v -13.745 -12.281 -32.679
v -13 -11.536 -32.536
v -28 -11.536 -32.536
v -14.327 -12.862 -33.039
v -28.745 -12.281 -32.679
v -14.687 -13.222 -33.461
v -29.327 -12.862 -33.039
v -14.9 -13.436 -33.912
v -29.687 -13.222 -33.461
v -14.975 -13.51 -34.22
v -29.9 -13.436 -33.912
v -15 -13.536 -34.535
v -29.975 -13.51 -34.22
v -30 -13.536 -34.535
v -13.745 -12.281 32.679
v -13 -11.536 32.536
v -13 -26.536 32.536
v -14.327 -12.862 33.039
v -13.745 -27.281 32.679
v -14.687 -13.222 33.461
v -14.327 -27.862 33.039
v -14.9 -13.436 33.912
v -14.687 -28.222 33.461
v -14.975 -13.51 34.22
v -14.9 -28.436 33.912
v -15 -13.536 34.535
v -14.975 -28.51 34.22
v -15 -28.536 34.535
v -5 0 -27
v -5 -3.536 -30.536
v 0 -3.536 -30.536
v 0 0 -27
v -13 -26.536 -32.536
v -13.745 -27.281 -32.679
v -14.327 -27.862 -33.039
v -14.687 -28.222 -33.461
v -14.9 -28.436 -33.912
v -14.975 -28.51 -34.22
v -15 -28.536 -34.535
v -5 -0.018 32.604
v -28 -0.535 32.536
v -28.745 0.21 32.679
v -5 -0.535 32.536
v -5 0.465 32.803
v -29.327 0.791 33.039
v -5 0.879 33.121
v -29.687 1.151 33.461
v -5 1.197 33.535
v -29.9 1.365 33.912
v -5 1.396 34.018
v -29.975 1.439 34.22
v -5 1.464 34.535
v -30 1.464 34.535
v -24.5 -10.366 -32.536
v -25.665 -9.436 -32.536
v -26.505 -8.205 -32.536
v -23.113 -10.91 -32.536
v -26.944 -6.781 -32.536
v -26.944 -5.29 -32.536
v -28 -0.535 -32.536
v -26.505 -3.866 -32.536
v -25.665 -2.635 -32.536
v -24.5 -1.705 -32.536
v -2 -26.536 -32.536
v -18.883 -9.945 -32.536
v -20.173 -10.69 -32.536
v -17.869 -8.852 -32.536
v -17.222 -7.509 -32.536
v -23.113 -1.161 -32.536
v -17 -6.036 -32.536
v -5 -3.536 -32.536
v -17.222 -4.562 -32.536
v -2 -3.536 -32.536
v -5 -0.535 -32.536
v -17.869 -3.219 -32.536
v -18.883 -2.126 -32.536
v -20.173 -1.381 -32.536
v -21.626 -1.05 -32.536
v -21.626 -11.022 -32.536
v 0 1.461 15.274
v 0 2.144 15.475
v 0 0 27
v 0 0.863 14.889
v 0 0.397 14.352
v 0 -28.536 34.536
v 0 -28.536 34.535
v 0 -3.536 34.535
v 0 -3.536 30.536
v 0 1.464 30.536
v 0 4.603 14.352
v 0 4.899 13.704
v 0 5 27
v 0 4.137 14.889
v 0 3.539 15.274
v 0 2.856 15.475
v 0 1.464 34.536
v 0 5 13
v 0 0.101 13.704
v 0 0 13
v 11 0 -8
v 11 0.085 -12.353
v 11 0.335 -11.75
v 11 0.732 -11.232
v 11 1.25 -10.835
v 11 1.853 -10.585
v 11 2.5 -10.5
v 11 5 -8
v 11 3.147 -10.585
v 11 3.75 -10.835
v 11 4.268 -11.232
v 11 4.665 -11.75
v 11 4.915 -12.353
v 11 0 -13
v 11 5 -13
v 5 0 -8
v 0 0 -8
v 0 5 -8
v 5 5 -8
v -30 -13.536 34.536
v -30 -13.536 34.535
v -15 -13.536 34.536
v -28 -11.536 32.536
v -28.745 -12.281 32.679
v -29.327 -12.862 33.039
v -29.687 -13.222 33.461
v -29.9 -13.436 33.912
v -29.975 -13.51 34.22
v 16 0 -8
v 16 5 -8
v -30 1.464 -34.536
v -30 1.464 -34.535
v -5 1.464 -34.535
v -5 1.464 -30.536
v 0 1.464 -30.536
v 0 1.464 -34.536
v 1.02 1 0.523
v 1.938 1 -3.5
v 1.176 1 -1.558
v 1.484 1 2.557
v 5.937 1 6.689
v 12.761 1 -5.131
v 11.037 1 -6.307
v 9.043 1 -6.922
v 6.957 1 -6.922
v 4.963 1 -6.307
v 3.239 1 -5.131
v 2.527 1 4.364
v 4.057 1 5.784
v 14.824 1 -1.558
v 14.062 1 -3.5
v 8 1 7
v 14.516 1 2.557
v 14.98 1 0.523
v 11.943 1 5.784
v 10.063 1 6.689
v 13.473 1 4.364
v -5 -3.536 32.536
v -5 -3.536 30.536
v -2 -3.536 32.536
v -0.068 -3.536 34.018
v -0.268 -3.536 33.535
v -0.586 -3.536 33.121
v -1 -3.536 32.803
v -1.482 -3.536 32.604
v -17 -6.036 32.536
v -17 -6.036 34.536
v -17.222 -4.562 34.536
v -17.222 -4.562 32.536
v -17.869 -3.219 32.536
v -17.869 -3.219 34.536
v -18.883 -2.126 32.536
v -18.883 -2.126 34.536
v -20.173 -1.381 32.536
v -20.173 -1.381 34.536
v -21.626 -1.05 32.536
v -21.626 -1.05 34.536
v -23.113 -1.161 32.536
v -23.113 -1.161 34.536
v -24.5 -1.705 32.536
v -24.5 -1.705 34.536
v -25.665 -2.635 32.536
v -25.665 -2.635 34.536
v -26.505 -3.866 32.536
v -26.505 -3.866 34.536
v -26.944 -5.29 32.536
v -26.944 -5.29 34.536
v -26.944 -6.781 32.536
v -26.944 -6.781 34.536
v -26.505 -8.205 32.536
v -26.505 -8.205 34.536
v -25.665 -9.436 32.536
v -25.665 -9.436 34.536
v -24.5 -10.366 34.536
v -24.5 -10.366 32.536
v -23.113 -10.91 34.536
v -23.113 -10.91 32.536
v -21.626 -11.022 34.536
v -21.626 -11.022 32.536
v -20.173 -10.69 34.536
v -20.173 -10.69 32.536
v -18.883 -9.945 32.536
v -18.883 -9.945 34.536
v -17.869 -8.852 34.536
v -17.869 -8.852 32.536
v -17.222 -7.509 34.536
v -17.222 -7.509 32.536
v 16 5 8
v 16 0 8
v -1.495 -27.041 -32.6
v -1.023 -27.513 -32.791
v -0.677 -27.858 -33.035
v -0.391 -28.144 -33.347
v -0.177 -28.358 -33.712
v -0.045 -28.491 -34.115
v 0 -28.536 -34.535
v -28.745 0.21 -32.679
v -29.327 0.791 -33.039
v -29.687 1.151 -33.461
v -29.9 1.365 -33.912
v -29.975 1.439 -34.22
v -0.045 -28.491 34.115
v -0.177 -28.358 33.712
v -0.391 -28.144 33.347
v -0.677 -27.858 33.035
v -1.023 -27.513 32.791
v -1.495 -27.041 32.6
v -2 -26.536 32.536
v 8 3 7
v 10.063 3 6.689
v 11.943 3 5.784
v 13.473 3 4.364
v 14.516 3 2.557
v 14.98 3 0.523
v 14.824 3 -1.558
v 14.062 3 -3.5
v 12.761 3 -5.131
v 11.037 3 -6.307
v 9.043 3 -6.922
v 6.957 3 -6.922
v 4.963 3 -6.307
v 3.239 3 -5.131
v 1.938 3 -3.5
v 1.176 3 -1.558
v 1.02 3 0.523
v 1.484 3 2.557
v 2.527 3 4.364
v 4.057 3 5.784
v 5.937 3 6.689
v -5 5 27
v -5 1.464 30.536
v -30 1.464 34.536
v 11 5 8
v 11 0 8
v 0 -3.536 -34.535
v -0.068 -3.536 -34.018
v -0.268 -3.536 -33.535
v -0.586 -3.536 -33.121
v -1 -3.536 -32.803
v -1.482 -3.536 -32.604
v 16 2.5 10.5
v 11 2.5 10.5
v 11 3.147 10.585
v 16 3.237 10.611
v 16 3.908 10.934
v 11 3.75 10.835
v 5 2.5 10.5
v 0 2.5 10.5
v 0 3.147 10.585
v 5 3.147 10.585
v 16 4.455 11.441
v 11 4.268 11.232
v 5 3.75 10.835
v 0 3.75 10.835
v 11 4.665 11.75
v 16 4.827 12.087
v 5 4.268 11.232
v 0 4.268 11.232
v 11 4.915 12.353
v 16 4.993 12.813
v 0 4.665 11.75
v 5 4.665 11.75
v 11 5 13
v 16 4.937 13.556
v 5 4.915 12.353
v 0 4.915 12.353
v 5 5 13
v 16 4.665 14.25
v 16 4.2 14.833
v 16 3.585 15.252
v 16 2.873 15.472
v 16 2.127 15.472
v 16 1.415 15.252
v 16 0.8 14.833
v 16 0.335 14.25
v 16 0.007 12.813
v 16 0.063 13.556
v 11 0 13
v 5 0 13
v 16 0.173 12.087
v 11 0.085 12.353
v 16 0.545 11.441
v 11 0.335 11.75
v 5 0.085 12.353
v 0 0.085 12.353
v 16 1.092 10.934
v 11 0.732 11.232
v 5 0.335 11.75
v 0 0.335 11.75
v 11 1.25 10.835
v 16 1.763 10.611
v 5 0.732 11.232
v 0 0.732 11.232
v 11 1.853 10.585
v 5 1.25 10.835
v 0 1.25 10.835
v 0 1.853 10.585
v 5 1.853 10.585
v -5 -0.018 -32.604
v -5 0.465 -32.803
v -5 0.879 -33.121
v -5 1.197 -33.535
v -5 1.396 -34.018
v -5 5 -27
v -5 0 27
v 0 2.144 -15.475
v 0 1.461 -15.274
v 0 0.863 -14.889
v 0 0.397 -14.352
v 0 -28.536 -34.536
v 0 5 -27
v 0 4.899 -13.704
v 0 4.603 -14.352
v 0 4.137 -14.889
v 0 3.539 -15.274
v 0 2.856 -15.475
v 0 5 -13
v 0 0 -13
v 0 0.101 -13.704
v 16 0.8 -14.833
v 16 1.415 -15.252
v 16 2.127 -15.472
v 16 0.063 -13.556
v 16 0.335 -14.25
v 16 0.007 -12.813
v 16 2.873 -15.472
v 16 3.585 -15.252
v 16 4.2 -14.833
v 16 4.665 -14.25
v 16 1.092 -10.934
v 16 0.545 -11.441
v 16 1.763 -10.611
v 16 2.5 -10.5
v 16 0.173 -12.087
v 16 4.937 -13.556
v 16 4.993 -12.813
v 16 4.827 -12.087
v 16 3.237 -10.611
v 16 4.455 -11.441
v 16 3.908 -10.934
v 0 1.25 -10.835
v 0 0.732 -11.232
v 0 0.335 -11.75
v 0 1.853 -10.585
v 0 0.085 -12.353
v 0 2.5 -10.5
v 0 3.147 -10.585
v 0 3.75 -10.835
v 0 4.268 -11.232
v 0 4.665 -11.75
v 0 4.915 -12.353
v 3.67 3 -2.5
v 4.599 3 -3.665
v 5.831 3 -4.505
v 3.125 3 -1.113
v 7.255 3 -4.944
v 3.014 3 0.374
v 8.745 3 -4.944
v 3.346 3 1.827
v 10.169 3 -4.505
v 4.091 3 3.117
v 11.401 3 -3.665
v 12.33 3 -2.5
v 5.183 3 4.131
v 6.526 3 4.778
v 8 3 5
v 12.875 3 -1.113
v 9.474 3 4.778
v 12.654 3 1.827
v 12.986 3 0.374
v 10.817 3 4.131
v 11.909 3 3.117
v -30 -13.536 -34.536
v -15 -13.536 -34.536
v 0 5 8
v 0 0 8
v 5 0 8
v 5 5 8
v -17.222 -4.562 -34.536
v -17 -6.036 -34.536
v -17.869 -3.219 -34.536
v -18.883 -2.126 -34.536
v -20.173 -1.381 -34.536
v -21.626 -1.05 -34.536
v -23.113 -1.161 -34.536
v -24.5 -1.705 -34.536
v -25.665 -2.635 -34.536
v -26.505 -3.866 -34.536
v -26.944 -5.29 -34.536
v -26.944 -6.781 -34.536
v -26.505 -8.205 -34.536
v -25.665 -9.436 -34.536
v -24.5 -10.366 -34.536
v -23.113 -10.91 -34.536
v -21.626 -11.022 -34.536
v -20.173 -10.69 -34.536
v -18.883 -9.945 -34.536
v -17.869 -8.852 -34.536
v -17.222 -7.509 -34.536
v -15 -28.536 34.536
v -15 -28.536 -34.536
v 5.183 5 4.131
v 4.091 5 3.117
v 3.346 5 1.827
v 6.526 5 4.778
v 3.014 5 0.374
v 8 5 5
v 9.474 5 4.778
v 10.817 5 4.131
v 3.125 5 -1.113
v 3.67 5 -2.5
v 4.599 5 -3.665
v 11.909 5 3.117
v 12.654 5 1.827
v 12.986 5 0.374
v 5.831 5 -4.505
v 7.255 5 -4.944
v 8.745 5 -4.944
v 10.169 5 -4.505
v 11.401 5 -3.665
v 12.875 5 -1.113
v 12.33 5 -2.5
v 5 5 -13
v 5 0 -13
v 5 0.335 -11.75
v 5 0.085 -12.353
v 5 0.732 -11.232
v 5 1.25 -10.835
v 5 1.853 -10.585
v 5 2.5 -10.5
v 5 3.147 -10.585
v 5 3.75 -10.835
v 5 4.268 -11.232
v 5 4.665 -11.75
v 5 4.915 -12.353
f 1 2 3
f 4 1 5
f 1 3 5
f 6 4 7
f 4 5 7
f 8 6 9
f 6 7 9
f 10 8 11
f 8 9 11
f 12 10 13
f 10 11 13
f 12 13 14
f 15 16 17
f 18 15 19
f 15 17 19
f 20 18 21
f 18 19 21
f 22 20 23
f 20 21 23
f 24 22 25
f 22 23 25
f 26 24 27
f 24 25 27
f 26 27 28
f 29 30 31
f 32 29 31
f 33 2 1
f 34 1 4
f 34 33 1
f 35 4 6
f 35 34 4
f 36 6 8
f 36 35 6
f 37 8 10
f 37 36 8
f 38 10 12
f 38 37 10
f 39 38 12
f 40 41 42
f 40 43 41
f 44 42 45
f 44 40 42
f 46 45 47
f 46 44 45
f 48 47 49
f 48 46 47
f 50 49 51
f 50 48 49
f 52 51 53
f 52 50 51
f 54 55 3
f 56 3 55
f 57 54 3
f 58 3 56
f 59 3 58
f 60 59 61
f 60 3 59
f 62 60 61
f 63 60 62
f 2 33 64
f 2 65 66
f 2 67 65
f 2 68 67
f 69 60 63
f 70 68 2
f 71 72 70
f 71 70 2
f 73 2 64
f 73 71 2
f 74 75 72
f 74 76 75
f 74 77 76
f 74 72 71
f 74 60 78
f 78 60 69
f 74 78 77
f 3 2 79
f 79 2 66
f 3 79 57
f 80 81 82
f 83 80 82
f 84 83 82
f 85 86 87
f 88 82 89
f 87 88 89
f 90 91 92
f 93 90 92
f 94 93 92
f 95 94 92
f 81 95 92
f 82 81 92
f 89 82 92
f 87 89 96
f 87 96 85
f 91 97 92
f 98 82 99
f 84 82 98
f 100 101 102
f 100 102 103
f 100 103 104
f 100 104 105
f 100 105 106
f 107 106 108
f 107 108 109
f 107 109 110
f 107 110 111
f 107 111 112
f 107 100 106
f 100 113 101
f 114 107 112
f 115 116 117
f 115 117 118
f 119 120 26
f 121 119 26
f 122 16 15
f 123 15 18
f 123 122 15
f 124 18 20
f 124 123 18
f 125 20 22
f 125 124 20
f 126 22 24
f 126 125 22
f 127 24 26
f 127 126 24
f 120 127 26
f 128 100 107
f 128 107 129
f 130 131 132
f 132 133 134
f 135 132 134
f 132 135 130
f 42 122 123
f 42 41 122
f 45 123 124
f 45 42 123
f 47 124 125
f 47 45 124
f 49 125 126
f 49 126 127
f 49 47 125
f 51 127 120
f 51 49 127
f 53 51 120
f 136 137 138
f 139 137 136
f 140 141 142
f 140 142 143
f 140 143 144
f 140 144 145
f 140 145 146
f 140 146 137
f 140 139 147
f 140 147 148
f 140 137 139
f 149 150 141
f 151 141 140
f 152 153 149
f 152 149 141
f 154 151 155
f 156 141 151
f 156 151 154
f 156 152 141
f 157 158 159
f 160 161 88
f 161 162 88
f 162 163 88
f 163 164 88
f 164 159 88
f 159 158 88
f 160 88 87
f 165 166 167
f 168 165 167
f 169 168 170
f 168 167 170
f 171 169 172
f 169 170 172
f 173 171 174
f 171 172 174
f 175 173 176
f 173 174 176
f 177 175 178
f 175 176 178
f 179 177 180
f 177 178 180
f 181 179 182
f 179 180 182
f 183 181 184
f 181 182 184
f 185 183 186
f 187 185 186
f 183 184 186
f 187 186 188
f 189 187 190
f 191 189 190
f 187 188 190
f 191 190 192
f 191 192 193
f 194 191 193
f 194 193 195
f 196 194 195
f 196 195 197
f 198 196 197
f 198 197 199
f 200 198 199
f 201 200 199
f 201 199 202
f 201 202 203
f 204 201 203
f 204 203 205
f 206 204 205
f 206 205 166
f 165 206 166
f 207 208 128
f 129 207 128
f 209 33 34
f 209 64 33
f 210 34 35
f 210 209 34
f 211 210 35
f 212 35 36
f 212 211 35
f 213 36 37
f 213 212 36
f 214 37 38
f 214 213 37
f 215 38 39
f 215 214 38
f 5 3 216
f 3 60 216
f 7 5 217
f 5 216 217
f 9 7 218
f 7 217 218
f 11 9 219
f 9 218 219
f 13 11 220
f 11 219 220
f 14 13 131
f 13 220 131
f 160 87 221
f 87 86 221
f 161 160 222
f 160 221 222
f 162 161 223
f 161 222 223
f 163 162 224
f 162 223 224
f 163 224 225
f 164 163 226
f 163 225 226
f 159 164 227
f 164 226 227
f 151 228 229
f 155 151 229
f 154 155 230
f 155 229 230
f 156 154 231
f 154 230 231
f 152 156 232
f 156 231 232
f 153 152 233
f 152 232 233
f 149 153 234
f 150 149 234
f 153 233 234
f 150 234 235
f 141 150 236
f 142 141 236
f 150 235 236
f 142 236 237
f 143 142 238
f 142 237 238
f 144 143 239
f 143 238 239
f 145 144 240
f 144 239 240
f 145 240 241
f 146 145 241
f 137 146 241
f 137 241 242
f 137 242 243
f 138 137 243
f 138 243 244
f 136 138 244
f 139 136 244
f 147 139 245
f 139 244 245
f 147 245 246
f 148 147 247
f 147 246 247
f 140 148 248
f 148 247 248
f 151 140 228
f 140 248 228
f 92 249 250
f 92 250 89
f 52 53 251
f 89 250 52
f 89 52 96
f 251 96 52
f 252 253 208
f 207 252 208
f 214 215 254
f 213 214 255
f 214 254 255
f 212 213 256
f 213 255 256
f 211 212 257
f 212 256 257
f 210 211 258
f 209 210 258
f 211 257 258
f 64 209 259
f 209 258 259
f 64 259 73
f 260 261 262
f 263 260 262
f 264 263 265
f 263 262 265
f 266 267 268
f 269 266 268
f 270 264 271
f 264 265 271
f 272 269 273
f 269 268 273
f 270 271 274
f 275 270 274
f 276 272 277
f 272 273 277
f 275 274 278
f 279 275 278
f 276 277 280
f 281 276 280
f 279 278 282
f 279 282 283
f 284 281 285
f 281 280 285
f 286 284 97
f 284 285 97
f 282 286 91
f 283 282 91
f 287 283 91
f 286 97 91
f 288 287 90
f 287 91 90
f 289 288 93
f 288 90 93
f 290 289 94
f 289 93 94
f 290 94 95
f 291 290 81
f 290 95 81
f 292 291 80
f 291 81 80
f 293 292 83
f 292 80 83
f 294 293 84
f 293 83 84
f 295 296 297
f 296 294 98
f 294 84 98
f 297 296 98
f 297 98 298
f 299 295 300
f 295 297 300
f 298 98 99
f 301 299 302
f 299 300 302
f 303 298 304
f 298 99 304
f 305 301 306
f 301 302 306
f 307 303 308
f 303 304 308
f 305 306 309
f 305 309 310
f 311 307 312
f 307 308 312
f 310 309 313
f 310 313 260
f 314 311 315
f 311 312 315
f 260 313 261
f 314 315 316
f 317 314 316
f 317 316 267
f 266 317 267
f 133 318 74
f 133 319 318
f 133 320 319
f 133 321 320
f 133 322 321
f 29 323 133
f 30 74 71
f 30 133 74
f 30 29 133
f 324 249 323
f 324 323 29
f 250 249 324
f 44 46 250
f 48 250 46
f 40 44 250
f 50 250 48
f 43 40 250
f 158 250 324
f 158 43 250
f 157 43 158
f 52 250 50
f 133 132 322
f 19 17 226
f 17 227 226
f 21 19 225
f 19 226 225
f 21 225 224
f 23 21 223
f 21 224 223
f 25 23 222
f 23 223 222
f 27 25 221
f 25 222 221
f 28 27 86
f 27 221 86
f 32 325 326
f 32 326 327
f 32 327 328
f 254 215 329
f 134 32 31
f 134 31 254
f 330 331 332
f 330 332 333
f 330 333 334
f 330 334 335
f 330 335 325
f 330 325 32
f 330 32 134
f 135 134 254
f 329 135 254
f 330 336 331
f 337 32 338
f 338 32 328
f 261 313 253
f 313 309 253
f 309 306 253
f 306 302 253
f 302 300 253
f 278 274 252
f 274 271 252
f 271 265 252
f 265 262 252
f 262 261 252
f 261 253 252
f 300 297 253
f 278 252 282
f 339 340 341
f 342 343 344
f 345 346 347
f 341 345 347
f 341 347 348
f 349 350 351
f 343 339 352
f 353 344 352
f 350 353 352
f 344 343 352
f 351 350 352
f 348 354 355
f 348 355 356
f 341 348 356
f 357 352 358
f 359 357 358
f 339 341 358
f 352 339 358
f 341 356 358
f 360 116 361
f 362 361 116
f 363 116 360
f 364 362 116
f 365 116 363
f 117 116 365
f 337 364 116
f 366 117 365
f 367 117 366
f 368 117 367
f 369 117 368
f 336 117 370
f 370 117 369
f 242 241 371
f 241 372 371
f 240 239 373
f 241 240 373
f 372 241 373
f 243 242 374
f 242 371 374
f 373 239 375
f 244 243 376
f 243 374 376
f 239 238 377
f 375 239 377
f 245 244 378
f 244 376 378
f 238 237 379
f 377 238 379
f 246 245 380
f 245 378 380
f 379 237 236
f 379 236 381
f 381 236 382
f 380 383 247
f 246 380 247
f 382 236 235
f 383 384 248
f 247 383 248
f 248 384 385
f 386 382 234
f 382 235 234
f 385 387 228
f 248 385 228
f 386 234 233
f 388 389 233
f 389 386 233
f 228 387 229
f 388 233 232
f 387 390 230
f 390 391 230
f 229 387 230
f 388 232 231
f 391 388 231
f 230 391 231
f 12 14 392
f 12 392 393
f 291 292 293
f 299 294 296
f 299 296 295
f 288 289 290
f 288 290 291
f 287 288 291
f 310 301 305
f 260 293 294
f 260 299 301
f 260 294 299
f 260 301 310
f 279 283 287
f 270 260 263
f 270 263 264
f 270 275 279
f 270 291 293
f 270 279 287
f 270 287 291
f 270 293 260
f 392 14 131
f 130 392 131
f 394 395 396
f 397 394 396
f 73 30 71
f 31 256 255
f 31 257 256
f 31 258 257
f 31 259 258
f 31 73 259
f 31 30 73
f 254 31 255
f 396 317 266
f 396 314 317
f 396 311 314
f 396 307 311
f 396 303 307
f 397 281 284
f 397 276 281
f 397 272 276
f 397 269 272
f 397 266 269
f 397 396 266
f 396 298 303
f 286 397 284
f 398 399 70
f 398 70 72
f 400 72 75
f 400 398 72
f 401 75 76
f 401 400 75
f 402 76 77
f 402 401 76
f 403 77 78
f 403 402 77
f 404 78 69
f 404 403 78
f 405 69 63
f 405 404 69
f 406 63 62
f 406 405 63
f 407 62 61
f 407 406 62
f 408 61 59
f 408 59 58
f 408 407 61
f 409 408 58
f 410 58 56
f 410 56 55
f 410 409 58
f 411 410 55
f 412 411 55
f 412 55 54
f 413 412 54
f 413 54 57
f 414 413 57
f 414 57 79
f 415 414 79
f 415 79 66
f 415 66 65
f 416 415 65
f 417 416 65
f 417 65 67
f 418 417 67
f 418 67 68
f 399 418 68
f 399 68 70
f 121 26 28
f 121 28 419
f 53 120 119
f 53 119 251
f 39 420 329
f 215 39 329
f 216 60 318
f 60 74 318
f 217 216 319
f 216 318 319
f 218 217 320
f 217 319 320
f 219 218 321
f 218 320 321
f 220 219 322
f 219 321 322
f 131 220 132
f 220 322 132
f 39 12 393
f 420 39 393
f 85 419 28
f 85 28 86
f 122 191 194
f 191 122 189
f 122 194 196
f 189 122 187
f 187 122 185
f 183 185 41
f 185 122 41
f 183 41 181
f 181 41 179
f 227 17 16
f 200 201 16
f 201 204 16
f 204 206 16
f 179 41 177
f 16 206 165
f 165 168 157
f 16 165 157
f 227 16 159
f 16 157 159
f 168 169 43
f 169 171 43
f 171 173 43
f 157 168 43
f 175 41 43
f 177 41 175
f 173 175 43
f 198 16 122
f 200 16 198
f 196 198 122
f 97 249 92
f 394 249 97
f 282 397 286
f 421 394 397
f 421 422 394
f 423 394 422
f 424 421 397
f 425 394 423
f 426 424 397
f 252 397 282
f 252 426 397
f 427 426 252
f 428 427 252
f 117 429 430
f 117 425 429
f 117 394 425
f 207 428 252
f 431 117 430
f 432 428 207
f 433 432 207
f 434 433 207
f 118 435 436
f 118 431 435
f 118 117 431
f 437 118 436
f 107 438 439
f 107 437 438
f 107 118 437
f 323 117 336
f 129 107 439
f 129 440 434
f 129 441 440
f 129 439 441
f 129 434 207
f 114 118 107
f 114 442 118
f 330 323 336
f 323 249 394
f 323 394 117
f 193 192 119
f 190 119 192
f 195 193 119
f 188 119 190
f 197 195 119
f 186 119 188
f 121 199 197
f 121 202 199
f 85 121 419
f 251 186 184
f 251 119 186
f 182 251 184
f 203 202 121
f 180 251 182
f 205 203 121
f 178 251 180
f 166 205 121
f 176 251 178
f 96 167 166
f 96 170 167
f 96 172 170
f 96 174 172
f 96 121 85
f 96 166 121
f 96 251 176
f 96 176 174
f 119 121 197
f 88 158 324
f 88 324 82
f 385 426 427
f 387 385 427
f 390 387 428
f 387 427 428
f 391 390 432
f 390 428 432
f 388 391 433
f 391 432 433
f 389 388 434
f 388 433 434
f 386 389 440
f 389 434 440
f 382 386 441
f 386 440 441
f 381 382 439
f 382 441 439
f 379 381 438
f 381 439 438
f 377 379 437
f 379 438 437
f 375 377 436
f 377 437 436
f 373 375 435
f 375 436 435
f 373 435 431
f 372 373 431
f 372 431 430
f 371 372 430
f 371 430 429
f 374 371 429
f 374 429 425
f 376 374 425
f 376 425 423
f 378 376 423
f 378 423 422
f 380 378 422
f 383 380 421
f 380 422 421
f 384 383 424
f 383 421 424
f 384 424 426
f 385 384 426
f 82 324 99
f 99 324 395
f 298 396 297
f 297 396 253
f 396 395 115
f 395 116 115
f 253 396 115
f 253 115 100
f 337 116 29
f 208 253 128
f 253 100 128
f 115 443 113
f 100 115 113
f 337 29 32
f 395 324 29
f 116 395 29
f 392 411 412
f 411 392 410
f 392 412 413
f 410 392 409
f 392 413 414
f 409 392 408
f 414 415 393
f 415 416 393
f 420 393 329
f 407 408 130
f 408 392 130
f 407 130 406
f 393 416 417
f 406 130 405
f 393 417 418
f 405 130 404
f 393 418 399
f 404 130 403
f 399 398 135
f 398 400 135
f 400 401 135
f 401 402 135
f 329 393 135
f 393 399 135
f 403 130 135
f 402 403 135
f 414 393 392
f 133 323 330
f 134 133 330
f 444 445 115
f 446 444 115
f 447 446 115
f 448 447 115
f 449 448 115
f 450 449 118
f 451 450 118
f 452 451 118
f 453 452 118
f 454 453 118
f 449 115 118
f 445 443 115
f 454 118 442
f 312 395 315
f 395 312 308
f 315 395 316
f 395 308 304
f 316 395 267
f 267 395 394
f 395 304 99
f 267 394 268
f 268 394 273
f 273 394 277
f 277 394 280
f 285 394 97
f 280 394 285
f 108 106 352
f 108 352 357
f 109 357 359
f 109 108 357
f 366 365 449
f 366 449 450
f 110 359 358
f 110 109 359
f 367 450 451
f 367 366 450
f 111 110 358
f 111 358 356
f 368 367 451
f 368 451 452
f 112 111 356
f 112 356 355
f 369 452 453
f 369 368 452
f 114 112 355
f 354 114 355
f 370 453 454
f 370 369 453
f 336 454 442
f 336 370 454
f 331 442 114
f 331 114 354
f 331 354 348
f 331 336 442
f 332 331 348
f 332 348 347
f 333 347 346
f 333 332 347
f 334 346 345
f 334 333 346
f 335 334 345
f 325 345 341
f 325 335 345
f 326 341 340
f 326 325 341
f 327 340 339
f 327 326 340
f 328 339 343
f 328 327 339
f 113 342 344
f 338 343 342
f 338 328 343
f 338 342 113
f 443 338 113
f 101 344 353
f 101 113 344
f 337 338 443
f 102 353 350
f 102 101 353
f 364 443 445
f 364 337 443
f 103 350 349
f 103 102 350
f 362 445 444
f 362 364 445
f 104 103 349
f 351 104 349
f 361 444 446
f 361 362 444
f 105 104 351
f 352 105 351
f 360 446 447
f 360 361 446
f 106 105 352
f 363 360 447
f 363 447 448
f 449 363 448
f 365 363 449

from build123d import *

# Parameters (mm, degrees)
SKETCH1_W            = 5
SKETCH1_H            = 54
BOSS_EXTRUDE1_DEPTH  = 5
SKETCH3_W            = 16
SKETCH3_H            = 16
BOSS_EXTRUDE2_DEPTH  = 5
SKETCH6_W            = 5
SKETCH6_H            = 5
BOSS_EXTRUDE5_DEPTH  = 5
SKETCH10_W           = 30
SKETCH10_H           = 15
BOSS_EXTRUDE9_DEPTH  = 4
CUT_EXTRUDE1_DEPTH   = 2
CUT_EXTRUDE2_REACH   = 71.784
SKETCH11_R           = 5
SKETCH13_W           = 15
SKETCH13_H           = 2
BOSS_EXTRUDE10_DEPTH = 15
SKETCH4_R            = 5
CUT_EXTRUDE3_DEPTH   = 2
SKETCH14_R           = 7
CUT_EXTRUDE4_DEPTH   = 2
SKETCH16_W           = 6
SKETCH16_H           = 5
BOSS_EXTRUDE11_DEPTH = 5
BOSS_EXTRUDE12_START = -11
SKETCH17_R           = 2.5
BOSS_EXTRUDE12_DEPTH = 16
FILLET1_R            = 2


with BuildPart() as part:
    # Sketch1 → Boss-Extrude1 (new body)
    with BuildSketch(Plane(origin=(0, 0, 0), x_dir=(1, 0, 0), z_dir=(0, 1, 0))):
        with Locations((-2.5, 0)):
            Rectangle(SKETCH1_W, SKETCH1_H)
    extrude(amount=BOSS_EXTRUDE1_DEPTH)

    # Sketch3 → Boss-Extrude2 (add)
    with BuildSketch(Plane(origin=(0, 0, 0), x_dir=(1, 0, 0), z_dir=(0, 1, 0))):
        with Locations((8, 0)):
            Rectangle(SKETCH3_W, SKETCH3_H)
    extrude(amount=BOSS_EXTRUDE2_DEPTH)

    # Sketch6 → Boss-Extrude5 (add, along a direction that is not the sketch's normal)
    with BuildSketch(Plane.XY.offset(27)):
        with Locations((-2.5, 2.5)):
            Rectangle(SKETCH6_W, SKETCH6_H)
    boss_extrude5 = extrude(amount=BOSS_EXTRUDE5_DEPTH, dir=(0, -0.7071067811865479, 0.7071067811865472))

    # Sketch10 → Boss-Extrude9 (add)
    with BuildSketch(Plane.XY.offset(30.535533906)):
        with Locations((-15, -6.035533906)):
            Rectangle(SKETCH10_W, SKETCH10_H)
    boss_extrude9 = extrude(amount=BOSS_EXTRUDE9_DEPTH)

    # Sketch12 → Cut-Extrude1 (cut)
    with BuildSketch(Plane(origin=(0, 0, 30.535533906), x_dir=(-1, 0, 0), z_dir=(0, 0, -1))):
        Polygon((30, -13.535533906), (30, 1.464466094), (5, 1.464466094), (5, -3.535533906), (0, -3.535533906), (0, -13.535533906), align=None)
    cut_extrude1 = extrude(amount=-CUT_EXTRUDE1_DEPTH, mode=Mode.SUBTRACT)

    # Sketch11 → Cut-Extrude2 (cut, up to next)
    with BuildSketch(Plane.XY.offset(34.535533906), mode=Mode.PRIVATE) as cut_extrude2_sk1:
        with Locations((-22, -6.035533906)):
            Circle(SKETCH11_R)
    cut_extrude2_tool1 = extrude(cut_extrude2_sk1.sketch, amount=-CUT_EXTRUDE2_REACH, mode=Mode.PRIVATE) & part.part
    cut_extrude2 = cut_extrude2_tool1.solids().sort_by_distance((-22, -6.035534, 34.535534))[0]
    add(cut_extrude2, mode=Mode.SUBTRACT)

    # Sketch13 → Boss-Extrude10 (add)
    with BuildSketch(Plane.XZ.offset(13.535533906)):
        with Locations((-7.5, 33.535533906)):
            Rectangle(SKETCH13_W, SKETCH13_H)
    boss_extrude10 = extrude(amount=BOSS_EXTRUDE10_DEPTH)

    # Sketch4 → Cut-Extrude3 (cut)
    with BuildSketch(Plane(origin=(0, 5, 0), x_dir=(1, 0, 0), z_dir=(0, 1, 0))):
        with Locations(Location((8, 0, 0), (0, 0, 270))):
            Circle(SKETCH4_R)
    extrude(amount=-CUT_EXTRUDE3_DEPTH, mode=Mode.SUBTRACT)

    # Sketch14 → Cut-Extrude4 (cut)
    with BuildSketch(Plane(origin=(0, 3, 0), x_dir=(1, 0, 0), z_dir=(0, 1, 0))):
        with Locations(Location((8, 0, 0), (0, 0, 270))):
            Circle(SKETCH14_R)
    extrude(amount=-CUT_EXTRUDE4_DEPTH, mode=Mode.SUBTRACT)

    # Sketch16 → Boss-Extrude11 (add)
    with BuildSketch(Plane.XY.offset(8)):
        with Locations((8, 2.5)):
            Rectangle(SKETCH16_W, SKETCH16_H)
    boss_extrude11 = extrude(amount=BOSS_EXTRUDE11_DEPTH)

    # Sketch17 → Boss-Extrude12 (add)
    with BuildSketch(Plane(origin=(11, 0, 0), x_dir=(0, 0, -1), z_dir=(1, 0, 0)).offset(BOSS_EXTRUDE12_START)):
        with Locations((-13, 2.5)):
            Circle(SKETCH17_R)
    boss_extrude12 = extrude(amount=BOSS_EXTRUDE12_DEPTH)

    # Mirror2: Boss-Extrude5, Boss-Extrude9, Cut-Extrude1, Cut-Extrude2, Boss-Extrude10, Boss-Extrude11, Boss-Extrude12 across plane
    add(boss_extrude5.mirror(Plane.XY))
    add(boss_extrude9.mirror(Plane.XY))
    add(cut_extrude1.mirror(Plane.XY), mode=Mode.SUBTRACT)
    add(cut_extrude2.mirror(Plane.XY), mode=Mode.SUBTRACT)
    add(boss_extrude10.mirror(Plane.XY))
    add(boss_extrude11.mirror(Plane.XY))
    add(boss_extrude12.mirror(Plane.XY))

    # Fillet1
    fillet1_edges = [part.edges().sort_by_distance(p)[0] for p in [
        (0, -16.035533906, -32.535533906),
        (0, -16.035533906, 32.535533906),
        (-7.5, -28.535533906, 32.535533906),
        (-17.5, 1.464466094, -32.535533906),
        (-30, -6.035533906, -32.535533906),
        (-22.5, -13.535533906, -32.535533906),
        (-15, -21.035533906, -32.535533906),
        (-7.5, -28.535533906, -32.535533906),
        (-17.5, 1.464466094, 32.535533906),
        (-30, -6.035533906, 32.535533906),
        (-22.5, -13.535533906, 32.535533906),
        (-15, -21.035533906, 32.535533906),
    ]]
    fillet(fillet1_edges, radius=FILLET1_R - 0.0001)  # a hair under: the kernel refuses the full size


solid = part.part
